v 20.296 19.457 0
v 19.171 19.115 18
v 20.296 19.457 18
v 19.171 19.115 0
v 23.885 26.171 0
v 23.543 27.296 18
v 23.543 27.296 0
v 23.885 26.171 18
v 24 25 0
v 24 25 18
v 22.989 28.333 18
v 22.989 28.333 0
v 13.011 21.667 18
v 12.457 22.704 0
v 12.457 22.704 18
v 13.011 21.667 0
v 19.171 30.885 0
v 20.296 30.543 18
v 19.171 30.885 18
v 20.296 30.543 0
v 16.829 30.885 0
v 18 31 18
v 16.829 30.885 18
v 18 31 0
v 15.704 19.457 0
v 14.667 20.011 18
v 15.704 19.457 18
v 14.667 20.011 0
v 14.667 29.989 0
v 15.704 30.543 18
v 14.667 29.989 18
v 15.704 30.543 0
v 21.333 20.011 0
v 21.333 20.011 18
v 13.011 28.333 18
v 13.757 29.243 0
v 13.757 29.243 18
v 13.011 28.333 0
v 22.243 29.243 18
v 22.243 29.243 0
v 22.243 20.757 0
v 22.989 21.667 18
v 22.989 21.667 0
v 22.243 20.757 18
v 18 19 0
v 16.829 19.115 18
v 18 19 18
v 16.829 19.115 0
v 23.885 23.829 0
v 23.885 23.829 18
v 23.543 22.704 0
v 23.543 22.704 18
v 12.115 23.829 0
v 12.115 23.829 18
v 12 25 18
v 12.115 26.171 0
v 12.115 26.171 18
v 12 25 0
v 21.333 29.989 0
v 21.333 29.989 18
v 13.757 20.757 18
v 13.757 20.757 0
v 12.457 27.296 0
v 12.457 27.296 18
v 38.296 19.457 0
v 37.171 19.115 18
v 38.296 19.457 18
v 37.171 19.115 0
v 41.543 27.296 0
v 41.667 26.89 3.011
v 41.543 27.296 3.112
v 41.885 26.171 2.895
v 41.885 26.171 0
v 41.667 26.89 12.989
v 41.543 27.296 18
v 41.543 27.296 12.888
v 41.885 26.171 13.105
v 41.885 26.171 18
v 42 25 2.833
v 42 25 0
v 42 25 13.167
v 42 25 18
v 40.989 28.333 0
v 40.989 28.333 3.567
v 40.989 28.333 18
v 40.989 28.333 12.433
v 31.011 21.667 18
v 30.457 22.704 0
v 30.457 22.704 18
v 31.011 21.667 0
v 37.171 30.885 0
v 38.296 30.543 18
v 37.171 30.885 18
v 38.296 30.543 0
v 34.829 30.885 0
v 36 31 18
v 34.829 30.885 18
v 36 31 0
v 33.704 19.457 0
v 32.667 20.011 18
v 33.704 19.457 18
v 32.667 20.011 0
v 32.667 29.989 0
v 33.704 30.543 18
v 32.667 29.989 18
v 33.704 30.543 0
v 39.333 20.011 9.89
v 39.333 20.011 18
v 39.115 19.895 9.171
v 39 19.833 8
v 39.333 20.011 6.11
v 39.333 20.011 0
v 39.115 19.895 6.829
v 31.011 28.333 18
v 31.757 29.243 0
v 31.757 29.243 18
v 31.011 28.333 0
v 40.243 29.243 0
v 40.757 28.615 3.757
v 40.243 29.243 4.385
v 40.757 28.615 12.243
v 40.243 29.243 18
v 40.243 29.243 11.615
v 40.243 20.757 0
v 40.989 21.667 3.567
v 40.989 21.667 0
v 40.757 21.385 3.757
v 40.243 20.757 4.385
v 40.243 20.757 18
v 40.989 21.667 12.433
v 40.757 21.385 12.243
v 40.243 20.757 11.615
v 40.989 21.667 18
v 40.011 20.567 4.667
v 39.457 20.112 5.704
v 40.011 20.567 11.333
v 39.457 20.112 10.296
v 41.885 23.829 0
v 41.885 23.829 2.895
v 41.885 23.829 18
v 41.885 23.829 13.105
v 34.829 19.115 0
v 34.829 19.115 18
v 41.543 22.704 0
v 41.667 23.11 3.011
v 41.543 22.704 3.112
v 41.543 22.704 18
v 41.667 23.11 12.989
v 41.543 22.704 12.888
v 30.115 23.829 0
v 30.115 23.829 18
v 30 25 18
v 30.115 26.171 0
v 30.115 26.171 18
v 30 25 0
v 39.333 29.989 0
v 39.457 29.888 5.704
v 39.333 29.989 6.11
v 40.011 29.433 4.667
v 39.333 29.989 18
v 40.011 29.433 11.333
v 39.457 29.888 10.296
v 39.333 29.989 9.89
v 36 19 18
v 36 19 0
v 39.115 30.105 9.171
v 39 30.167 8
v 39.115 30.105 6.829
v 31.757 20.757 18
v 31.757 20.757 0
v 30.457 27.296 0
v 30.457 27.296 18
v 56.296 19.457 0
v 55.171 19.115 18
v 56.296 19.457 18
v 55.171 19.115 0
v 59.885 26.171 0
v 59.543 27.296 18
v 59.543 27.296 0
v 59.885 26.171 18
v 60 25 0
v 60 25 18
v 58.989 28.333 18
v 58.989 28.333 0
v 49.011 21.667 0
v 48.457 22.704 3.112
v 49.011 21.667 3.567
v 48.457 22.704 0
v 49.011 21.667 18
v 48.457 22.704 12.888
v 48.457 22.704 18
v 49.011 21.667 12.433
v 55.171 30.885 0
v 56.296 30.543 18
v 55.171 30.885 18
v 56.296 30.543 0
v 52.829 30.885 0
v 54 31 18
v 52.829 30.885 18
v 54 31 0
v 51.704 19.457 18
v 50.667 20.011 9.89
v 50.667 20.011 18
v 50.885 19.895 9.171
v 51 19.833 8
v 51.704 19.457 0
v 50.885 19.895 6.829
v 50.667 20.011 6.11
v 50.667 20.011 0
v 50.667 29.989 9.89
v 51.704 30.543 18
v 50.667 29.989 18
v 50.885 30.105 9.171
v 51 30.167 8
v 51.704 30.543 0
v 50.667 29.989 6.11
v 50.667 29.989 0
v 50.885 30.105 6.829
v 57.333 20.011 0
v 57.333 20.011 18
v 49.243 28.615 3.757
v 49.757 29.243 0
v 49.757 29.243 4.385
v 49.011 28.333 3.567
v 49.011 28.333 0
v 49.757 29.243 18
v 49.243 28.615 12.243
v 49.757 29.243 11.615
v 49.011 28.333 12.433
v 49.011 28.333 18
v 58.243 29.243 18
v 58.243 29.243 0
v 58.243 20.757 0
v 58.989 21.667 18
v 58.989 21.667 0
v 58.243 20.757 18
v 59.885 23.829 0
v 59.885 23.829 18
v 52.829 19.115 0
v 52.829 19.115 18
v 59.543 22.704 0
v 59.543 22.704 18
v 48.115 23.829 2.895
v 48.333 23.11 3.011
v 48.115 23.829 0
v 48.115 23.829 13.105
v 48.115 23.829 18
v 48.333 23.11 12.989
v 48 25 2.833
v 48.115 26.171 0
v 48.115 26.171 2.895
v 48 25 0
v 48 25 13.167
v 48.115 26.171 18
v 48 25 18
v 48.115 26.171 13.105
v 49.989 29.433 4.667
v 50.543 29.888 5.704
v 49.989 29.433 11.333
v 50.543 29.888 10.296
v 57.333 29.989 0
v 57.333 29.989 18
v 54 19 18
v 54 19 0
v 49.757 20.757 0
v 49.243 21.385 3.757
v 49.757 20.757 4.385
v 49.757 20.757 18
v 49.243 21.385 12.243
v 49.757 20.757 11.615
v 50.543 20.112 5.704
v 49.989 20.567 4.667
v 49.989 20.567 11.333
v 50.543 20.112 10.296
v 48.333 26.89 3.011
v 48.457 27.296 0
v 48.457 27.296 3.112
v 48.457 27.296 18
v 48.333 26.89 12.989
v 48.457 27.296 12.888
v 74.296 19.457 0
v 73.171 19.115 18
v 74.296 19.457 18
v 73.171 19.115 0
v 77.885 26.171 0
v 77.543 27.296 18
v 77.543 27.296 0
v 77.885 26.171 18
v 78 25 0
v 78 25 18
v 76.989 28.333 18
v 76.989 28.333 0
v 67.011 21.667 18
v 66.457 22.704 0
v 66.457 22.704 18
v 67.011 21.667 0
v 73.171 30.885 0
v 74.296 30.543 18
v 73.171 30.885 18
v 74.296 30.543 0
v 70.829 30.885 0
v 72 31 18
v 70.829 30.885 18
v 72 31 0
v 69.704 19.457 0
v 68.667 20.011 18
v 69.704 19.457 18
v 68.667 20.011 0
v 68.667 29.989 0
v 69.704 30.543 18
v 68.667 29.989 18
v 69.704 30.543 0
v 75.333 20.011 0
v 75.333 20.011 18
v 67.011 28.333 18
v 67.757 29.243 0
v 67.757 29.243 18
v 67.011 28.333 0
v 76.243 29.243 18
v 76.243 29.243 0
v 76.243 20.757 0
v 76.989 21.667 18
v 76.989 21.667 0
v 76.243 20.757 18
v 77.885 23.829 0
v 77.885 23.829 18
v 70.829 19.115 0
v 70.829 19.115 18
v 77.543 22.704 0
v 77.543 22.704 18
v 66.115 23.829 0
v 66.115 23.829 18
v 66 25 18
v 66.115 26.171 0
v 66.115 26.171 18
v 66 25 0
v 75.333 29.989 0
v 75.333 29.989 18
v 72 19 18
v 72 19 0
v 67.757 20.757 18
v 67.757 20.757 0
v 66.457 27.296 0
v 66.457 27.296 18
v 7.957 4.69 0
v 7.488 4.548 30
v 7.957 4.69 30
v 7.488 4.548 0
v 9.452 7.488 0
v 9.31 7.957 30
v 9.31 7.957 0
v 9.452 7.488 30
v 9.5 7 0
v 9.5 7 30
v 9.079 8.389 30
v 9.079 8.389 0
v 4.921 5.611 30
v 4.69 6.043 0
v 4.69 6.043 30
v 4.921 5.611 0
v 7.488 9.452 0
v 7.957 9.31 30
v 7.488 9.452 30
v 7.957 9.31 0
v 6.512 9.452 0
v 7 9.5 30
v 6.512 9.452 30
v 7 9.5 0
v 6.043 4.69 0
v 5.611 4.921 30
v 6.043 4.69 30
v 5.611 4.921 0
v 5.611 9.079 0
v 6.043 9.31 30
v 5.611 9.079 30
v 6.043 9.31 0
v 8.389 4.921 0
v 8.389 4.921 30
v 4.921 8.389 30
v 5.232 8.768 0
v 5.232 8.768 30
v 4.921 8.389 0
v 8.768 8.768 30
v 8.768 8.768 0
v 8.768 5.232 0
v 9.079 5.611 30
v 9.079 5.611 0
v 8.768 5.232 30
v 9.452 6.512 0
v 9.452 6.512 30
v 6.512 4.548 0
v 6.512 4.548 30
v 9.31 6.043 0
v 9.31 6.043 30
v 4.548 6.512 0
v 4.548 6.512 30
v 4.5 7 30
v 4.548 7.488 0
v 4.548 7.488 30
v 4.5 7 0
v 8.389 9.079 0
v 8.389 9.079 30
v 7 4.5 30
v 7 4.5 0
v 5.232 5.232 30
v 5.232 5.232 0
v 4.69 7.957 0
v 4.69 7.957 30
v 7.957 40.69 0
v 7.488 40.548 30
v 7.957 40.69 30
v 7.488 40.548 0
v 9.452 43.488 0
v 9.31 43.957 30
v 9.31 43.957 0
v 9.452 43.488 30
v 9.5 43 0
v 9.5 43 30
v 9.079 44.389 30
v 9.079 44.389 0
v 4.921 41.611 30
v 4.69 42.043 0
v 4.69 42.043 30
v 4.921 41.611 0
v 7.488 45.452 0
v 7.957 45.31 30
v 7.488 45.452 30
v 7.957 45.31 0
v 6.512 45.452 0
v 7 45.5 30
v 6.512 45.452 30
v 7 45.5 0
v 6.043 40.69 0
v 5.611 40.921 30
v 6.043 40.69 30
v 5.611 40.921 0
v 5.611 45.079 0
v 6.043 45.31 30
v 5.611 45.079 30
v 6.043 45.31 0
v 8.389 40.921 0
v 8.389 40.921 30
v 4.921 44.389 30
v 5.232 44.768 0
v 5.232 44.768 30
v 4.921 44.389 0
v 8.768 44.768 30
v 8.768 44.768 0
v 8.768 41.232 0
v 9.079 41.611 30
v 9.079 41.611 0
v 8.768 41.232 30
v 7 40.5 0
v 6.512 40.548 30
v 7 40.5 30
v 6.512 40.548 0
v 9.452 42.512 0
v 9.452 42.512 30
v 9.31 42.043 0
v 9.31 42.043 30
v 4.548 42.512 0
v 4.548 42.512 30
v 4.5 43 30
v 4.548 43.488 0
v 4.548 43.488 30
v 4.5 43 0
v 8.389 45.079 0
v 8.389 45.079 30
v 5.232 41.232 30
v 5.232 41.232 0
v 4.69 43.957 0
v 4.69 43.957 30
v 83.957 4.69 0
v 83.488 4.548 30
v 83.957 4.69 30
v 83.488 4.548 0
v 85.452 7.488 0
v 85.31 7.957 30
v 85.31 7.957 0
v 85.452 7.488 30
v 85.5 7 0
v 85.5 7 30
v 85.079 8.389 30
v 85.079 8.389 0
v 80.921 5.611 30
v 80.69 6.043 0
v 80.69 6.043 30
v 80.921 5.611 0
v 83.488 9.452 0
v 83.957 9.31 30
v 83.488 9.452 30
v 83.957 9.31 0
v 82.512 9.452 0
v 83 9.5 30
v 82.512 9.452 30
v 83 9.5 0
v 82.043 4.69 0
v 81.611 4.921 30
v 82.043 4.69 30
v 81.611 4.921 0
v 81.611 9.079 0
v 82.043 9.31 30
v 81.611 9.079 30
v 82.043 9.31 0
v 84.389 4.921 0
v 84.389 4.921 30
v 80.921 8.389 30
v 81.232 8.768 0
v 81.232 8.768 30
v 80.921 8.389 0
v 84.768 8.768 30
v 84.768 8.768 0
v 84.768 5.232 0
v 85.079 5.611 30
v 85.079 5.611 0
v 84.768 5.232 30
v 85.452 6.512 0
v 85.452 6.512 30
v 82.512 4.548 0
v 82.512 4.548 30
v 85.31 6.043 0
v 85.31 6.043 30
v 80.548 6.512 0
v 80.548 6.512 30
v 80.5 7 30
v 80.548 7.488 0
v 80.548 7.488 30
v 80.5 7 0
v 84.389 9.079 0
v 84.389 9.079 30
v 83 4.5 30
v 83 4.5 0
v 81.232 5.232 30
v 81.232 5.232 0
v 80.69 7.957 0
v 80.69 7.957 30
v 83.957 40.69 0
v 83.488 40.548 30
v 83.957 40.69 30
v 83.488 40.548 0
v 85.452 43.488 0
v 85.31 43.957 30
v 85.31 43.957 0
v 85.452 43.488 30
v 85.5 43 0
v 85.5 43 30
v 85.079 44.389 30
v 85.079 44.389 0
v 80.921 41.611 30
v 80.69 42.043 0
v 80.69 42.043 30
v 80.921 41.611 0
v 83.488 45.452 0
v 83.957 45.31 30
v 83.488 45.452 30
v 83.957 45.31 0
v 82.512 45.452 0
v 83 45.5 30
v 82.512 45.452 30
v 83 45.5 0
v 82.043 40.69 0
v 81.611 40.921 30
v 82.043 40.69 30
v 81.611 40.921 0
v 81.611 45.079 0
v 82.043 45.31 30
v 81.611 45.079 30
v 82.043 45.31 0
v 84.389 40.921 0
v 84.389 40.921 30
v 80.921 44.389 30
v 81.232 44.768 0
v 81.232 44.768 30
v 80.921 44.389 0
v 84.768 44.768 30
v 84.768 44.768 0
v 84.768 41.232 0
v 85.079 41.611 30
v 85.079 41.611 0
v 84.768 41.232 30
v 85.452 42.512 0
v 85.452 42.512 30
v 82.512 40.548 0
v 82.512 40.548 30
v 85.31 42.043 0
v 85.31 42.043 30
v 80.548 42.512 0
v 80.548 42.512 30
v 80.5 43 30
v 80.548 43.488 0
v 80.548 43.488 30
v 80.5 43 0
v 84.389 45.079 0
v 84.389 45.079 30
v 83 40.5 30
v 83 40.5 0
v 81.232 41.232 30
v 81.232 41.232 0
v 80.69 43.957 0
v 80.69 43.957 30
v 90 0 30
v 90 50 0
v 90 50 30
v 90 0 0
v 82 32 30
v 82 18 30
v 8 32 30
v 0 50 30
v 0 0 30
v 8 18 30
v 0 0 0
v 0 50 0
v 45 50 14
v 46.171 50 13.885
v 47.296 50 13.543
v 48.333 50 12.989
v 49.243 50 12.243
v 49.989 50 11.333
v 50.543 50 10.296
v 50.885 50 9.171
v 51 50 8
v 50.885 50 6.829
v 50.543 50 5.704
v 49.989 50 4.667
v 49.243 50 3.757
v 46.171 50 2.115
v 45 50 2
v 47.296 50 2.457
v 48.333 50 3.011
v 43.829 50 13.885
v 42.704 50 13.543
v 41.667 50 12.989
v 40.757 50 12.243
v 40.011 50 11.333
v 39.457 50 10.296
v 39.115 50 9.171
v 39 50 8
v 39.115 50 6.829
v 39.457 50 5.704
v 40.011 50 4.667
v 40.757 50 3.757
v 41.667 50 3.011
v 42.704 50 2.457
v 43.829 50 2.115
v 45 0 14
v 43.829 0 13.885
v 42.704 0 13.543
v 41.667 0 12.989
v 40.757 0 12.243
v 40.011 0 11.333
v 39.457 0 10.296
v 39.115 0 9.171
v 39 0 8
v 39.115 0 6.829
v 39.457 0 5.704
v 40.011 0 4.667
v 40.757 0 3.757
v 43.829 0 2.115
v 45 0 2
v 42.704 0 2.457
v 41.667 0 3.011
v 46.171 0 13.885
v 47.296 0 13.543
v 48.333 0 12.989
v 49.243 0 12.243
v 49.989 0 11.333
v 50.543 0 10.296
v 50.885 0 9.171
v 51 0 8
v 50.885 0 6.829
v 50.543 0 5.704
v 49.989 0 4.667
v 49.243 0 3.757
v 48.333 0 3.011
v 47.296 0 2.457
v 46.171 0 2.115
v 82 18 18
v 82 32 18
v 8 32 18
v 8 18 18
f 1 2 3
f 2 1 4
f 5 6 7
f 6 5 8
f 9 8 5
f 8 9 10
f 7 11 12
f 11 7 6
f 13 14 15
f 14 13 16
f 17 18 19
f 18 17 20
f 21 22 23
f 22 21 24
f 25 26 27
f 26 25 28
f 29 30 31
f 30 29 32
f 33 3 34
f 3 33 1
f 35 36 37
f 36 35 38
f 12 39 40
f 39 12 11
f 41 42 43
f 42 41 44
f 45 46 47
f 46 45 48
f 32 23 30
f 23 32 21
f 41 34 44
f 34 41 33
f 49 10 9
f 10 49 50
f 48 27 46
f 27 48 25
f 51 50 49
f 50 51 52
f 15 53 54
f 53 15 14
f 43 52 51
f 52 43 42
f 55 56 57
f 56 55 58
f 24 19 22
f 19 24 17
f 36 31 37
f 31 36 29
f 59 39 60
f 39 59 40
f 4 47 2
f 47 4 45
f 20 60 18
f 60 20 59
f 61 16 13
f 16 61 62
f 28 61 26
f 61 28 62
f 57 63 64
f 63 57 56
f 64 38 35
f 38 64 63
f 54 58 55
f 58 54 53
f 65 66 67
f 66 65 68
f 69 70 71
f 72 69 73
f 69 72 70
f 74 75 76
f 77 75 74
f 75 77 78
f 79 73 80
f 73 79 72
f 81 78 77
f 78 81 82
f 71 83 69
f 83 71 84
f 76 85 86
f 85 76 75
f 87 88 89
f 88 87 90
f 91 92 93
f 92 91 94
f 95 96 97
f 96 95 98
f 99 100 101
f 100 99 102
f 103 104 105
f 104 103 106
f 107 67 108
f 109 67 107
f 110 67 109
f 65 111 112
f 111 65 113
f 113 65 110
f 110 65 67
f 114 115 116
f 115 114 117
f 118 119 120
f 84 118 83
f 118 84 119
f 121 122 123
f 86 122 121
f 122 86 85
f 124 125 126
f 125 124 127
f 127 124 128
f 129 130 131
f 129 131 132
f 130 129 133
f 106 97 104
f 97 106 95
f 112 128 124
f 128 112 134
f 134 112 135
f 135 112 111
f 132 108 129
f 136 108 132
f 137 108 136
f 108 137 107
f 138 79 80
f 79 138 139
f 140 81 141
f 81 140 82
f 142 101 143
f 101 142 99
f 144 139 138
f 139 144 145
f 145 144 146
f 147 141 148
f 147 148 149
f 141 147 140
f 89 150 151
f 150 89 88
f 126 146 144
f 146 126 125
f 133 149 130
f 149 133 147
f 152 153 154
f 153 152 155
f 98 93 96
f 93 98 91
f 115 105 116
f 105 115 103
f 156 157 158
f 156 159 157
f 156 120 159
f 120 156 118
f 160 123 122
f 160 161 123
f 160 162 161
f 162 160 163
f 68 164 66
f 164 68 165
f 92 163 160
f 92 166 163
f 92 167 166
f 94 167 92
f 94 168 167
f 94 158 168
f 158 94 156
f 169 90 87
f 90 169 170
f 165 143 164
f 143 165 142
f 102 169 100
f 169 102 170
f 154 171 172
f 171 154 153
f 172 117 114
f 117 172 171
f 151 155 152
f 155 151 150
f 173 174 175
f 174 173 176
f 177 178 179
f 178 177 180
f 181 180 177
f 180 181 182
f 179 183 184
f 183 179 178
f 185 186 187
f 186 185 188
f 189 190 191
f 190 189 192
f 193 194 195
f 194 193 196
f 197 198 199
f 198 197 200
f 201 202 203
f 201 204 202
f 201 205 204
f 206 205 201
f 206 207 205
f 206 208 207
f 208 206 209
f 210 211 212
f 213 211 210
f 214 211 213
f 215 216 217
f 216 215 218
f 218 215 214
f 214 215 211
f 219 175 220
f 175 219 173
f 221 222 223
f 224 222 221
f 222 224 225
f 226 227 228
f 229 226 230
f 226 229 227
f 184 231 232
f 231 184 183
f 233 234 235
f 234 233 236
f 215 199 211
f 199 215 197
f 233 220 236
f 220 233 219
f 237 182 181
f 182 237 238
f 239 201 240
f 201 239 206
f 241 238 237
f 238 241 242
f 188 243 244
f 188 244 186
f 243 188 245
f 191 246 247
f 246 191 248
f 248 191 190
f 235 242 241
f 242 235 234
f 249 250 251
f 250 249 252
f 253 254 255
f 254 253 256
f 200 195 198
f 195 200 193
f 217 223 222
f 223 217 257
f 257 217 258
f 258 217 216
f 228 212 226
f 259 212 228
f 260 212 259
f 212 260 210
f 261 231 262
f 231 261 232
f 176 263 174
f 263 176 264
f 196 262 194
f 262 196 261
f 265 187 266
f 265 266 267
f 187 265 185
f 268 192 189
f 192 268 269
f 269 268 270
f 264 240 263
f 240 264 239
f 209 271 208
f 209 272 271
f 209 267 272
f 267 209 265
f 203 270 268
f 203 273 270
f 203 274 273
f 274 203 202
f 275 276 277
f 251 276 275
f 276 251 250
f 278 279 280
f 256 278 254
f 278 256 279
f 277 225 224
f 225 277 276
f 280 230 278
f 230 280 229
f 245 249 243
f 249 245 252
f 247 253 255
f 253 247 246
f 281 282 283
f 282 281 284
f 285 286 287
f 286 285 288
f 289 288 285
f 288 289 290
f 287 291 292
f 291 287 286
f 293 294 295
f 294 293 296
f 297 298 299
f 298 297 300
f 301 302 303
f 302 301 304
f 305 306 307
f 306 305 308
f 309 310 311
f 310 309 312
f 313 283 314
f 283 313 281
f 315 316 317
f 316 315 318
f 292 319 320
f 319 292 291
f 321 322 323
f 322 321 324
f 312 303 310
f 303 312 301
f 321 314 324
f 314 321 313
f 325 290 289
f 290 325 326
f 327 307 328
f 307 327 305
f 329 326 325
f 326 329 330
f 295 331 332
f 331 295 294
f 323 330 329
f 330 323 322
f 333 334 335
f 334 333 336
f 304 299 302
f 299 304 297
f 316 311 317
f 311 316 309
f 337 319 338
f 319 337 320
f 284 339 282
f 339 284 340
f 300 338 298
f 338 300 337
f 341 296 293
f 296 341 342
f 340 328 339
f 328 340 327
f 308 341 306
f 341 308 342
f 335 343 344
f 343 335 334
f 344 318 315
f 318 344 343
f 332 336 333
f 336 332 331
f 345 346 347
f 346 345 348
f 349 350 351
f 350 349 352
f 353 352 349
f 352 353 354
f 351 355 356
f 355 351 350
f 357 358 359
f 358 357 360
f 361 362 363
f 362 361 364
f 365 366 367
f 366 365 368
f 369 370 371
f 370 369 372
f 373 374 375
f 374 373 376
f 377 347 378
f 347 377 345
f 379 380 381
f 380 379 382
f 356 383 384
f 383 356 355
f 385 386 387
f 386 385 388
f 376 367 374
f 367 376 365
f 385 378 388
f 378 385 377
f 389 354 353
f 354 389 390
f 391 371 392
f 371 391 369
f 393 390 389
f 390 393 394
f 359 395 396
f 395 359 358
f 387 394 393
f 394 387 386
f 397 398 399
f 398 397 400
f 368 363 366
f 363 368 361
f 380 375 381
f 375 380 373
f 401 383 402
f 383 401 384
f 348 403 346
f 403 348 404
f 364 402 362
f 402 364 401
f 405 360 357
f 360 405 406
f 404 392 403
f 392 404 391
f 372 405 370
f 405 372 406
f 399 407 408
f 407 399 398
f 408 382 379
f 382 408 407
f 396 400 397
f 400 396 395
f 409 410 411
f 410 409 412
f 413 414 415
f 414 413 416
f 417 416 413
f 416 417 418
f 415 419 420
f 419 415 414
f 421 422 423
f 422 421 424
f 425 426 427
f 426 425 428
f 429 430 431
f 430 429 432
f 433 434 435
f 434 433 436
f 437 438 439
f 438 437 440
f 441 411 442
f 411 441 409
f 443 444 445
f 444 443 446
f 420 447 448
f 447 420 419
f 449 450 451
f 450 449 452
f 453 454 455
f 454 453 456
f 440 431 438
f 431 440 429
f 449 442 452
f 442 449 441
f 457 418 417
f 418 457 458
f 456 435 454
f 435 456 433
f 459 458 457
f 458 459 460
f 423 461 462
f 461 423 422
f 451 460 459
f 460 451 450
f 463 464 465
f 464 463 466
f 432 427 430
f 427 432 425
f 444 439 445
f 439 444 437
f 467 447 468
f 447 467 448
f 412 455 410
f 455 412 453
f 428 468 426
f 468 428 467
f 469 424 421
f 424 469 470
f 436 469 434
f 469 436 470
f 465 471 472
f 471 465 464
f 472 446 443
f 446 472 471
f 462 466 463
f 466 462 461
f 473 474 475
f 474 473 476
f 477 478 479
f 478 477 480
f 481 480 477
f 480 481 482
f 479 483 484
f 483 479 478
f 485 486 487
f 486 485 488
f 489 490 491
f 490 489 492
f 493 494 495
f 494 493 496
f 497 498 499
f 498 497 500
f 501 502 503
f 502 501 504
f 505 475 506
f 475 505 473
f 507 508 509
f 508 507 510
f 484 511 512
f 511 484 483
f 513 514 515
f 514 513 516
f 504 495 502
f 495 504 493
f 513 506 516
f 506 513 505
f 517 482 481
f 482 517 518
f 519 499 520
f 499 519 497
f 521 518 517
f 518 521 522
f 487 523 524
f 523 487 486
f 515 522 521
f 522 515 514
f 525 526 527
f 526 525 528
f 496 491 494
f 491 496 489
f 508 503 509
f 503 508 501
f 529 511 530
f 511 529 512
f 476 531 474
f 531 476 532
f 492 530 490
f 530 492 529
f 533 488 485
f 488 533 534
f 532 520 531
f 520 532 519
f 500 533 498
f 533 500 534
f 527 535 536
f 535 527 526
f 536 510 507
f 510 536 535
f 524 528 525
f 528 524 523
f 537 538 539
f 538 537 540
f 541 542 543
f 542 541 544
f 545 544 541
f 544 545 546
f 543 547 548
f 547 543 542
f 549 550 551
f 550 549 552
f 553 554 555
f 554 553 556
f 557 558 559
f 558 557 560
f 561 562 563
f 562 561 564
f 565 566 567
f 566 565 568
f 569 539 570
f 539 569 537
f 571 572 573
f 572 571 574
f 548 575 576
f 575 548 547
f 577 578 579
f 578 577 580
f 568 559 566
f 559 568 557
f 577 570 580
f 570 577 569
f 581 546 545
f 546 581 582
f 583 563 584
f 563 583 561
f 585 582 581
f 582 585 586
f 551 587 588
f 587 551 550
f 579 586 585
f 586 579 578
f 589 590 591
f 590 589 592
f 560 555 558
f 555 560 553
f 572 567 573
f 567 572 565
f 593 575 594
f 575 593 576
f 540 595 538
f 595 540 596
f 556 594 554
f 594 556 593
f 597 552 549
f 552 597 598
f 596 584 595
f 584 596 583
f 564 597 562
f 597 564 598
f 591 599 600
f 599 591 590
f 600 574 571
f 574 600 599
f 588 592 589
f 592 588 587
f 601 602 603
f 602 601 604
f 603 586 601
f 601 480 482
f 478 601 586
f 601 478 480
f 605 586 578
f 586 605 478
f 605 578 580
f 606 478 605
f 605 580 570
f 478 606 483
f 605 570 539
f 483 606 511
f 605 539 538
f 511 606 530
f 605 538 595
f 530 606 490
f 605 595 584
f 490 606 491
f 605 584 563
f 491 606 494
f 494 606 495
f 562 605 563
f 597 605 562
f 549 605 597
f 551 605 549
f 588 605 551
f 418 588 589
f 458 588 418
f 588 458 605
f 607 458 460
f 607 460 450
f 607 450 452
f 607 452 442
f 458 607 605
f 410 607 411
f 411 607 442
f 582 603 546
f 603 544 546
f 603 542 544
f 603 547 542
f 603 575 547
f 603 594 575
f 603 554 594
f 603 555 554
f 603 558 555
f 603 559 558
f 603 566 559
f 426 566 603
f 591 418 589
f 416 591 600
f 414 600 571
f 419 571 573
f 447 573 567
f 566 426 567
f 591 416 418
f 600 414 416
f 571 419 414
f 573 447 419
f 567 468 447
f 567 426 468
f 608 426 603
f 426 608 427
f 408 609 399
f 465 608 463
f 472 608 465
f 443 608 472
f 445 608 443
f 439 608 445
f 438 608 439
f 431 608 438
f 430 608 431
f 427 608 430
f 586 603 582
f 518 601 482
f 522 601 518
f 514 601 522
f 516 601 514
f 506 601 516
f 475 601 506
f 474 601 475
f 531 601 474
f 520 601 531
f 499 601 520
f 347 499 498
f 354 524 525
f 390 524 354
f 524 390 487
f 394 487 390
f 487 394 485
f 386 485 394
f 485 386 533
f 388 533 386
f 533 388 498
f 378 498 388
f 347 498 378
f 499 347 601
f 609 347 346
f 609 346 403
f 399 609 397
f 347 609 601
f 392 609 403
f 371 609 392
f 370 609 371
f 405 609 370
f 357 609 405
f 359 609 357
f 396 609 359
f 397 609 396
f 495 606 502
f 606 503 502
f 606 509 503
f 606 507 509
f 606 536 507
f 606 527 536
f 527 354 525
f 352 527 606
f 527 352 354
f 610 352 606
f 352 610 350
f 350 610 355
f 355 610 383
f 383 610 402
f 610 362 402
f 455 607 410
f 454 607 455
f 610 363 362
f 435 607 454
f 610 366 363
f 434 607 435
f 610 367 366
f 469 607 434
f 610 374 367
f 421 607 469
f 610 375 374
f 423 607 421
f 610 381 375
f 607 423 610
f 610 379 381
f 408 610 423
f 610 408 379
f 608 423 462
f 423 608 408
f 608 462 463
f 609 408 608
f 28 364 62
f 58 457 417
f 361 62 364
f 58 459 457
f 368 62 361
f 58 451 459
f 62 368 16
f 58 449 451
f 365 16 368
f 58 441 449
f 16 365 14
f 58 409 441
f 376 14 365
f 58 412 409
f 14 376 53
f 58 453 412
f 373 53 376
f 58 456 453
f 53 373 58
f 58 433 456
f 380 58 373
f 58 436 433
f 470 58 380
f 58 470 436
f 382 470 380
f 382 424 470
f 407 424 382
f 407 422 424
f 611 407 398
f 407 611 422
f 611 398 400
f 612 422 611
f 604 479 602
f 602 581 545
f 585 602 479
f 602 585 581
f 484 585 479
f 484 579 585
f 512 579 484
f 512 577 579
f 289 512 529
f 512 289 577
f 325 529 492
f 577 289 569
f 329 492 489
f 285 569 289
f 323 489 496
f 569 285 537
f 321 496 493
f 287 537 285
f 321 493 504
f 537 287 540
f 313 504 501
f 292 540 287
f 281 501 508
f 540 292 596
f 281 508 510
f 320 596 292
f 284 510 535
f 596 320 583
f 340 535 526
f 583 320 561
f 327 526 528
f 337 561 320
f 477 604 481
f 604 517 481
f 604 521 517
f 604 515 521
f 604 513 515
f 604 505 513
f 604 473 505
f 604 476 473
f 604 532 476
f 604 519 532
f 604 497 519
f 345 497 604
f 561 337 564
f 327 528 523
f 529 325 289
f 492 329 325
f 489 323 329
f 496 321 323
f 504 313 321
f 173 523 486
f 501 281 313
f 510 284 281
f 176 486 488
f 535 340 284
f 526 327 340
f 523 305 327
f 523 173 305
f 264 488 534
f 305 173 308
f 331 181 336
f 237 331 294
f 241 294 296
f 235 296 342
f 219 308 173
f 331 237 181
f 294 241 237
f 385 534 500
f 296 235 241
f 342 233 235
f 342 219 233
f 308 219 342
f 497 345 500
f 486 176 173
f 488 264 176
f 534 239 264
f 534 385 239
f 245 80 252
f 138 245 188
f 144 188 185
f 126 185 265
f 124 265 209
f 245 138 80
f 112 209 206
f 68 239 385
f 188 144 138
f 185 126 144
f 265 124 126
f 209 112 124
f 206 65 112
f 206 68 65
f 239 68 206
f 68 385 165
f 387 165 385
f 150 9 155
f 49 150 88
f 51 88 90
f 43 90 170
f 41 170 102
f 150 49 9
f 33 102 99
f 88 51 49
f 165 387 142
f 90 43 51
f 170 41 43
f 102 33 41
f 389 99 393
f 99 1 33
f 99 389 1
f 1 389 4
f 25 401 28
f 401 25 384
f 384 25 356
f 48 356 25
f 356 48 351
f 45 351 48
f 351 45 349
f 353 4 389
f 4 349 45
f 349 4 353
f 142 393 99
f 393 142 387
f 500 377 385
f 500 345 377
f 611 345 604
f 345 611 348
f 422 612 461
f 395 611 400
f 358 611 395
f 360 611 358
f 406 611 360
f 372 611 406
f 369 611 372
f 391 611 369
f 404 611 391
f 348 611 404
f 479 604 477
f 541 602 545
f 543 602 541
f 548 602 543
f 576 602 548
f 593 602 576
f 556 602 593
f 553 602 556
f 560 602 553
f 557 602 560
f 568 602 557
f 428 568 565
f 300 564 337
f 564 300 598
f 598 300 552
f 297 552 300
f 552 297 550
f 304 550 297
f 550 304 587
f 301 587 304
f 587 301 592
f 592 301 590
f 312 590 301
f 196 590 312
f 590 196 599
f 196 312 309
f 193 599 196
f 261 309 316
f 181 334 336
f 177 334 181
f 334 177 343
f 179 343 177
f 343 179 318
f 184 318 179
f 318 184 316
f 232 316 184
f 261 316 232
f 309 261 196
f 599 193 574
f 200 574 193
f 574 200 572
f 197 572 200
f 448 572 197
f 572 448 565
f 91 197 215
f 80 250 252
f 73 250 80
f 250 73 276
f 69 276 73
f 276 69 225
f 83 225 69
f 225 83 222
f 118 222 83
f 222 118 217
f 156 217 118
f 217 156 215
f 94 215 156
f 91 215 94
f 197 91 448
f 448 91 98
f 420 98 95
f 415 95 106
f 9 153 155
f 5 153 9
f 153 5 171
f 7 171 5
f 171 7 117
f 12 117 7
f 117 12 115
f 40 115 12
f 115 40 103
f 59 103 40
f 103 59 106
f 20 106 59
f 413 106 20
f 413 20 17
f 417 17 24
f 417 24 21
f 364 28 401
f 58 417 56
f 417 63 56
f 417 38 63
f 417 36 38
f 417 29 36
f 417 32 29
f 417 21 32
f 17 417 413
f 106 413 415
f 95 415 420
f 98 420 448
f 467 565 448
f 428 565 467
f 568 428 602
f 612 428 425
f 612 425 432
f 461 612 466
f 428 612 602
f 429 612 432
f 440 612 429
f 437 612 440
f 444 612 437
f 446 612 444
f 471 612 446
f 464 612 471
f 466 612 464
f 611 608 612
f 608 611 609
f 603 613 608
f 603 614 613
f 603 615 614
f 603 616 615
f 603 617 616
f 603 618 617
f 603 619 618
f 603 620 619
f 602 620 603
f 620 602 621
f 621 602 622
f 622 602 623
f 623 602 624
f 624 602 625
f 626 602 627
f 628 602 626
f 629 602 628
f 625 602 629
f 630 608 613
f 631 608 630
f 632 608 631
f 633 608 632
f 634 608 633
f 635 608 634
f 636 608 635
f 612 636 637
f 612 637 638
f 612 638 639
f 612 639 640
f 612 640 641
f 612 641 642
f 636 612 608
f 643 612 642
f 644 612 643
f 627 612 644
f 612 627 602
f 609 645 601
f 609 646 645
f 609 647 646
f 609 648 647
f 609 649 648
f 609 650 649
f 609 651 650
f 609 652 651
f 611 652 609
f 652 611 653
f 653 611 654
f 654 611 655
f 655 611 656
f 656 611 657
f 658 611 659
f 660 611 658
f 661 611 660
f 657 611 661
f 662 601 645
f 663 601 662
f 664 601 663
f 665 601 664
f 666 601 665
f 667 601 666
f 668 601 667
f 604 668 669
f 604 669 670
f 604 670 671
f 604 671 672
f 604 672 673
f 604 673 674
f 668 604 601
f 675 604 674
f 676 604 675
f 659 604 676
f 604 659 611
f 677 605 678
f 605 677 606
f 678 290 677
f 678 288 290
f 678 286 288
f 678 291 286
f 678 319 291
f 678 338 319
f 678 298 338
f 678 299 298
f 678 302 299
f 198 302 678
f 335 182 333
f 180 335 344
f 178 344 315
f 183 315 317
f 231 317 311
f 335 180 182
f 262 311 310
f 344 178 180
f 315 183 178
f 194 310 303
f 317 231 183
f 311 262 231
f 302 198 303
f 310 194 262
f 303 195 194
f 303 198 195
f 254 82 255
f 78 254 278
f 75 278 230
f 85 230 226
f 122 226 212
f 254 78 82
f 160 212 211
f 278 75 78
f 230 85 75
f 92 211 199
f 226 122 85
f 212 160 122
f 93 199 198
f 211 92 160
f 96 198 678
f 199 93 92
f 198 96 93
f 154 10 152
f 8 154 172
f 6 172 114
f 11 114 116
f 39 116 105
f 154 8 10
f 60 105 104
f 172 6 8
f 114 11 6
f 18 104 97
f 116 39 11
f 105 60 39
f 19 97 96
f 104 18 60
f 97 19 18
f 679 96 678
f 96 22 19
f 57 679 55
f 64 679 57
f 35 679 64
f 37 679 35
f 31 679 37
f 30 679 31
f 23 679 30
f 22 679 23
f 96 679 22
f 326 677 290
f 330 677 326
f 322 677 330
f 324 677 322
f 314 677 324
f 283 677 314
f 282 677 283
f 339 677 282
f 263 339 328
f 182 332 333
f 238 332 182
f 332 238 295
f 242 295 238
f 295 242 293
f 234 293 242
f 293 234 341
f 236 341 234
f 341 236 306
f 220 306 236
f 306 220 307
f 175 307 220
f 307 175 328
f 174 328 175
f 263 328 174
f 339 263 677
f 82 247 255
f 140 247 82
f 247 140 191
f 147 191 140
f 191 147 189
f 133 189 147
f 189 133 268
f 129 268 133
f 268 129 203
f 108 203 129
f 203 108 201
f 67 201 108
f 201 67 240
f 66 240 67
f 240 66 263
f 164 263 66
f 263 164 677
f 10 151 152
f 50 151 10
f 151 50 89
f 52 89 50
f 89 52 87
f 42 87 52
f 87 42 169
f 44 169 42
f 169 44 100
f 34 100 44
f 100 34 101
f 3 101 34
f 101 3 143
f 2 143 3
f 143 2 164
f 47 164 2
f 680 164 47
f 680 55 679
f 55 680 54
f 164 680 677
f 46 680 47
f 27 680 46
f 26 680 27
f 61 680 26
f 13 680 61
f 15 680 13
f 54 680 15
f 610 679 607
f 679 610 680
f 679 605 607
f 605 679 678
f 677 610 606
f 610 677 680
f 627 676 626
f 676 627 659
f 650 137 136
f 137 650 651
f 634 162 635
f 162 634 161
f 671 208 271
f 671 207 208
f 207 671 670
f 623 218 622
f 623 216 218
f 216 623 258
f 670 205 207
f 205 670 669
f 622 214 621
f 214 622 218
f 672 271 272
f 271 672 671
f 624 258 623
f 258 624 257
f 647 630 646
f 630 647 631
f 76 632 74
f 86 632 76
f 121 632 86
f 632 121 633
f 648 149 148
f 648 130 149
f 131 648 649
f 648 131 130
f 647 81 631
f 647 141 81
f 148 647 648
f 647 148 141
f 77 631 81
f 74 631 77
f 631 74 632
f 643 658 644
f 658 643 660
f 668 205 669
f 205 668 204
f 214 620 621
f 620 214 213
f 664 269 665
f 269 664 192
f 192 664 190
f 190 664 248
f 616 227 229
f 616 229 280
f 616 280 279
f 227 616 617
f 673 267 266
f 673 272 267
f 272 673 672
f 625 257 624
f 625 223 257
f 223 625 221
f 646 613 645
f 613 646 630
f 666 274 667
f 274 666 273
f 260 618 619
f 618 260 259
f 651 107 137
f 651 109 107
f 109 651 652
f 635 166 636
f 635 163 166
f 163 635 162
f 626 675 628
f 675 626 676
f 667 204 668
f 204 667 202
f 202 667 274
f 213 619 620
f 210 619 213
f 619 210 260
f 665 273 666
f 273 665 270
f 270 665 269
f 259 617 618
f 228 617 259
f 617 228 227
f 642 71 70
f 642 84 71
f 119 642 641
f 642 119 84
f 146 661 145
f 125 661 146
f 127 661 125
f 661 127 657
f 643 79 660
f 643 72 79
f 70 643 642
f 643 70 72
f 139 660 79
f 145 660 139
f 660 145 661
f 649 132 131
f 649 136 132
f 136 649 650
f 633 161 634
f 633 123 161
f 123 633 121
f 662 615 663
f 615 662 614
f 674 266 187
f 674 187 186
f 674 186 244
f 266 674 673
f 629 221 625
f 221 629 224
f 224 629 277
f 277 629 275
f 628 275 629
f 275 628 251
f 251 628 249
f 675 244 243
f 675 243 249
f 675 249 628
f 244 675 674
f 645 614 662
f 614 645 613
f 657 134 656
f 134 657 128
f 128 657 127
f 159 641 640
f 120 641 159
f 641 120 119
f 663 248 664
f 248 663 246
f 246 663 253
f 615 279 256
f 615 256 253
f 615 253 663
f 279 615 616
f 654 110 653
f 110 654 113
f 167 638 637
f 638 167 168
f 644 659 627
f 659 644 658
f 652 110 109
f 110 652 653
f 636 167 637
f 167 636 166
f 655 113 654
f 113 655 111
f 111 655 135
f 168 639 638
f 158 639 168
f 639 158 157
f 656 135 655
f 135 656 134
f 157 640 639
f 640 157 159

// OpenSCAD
$fn = 32;

// ----------------------------------------------------------------------
// Manifold block: side_outlet manifold
// ----------------------------------------------------------------------

// --- parameters (mm) ---
block_l = 90;             // block length, X
block_w = 50;             // block width, Y
block_h = 30;             // block height, Z
port_d = 12;              // port bore diameter
port_pitch = 18;          // port pitch along X
gallery_d = 14;           // top gallery width, Y
gallery_depth = 12;       // gallery pocket depth
wall_p = 8;               // gallery end wall thickness, X
mnt_d = 5;                // mounting hole diameter
mnt_in = 7;               // mounting hole inset from the edges
out_d = 12;               // outlet bore diameter
out_z = 8;                // outlet axis height

n_ports = 4;  // ports in the row
port_x0 = (block_l - (n_ports - 1) * port_pitch) / 2;  // first port X

difference() {
  cube([block_l, block_w, block_h]);
  for (i = [0 : n_ports - 1])
    translate([port_x0 + i * port_pitch, block_w / 2, -1])
      cylinder(h = block_h + 2, d = port_d);
  translate([wall_p, block_w / 2 - gallery_d / 2, block_h - gallery_depth])
    cube([block_l - 2 * wall_p, gallery_d, gallery_depth + 1]);
  for (cx = [mnt_in, block_l - mnt_in])
    for (cy = [mnt_in, block_w - mnt_in])
      translate([cx, cy, -1]) cylinder(h = block_h + 2, d = mnt_d);
  translate([block_l / 2, -1, out_z]) rotate([-90, 0, 0])
    cylinder(h = block_w + 2, d = out_d);
}
